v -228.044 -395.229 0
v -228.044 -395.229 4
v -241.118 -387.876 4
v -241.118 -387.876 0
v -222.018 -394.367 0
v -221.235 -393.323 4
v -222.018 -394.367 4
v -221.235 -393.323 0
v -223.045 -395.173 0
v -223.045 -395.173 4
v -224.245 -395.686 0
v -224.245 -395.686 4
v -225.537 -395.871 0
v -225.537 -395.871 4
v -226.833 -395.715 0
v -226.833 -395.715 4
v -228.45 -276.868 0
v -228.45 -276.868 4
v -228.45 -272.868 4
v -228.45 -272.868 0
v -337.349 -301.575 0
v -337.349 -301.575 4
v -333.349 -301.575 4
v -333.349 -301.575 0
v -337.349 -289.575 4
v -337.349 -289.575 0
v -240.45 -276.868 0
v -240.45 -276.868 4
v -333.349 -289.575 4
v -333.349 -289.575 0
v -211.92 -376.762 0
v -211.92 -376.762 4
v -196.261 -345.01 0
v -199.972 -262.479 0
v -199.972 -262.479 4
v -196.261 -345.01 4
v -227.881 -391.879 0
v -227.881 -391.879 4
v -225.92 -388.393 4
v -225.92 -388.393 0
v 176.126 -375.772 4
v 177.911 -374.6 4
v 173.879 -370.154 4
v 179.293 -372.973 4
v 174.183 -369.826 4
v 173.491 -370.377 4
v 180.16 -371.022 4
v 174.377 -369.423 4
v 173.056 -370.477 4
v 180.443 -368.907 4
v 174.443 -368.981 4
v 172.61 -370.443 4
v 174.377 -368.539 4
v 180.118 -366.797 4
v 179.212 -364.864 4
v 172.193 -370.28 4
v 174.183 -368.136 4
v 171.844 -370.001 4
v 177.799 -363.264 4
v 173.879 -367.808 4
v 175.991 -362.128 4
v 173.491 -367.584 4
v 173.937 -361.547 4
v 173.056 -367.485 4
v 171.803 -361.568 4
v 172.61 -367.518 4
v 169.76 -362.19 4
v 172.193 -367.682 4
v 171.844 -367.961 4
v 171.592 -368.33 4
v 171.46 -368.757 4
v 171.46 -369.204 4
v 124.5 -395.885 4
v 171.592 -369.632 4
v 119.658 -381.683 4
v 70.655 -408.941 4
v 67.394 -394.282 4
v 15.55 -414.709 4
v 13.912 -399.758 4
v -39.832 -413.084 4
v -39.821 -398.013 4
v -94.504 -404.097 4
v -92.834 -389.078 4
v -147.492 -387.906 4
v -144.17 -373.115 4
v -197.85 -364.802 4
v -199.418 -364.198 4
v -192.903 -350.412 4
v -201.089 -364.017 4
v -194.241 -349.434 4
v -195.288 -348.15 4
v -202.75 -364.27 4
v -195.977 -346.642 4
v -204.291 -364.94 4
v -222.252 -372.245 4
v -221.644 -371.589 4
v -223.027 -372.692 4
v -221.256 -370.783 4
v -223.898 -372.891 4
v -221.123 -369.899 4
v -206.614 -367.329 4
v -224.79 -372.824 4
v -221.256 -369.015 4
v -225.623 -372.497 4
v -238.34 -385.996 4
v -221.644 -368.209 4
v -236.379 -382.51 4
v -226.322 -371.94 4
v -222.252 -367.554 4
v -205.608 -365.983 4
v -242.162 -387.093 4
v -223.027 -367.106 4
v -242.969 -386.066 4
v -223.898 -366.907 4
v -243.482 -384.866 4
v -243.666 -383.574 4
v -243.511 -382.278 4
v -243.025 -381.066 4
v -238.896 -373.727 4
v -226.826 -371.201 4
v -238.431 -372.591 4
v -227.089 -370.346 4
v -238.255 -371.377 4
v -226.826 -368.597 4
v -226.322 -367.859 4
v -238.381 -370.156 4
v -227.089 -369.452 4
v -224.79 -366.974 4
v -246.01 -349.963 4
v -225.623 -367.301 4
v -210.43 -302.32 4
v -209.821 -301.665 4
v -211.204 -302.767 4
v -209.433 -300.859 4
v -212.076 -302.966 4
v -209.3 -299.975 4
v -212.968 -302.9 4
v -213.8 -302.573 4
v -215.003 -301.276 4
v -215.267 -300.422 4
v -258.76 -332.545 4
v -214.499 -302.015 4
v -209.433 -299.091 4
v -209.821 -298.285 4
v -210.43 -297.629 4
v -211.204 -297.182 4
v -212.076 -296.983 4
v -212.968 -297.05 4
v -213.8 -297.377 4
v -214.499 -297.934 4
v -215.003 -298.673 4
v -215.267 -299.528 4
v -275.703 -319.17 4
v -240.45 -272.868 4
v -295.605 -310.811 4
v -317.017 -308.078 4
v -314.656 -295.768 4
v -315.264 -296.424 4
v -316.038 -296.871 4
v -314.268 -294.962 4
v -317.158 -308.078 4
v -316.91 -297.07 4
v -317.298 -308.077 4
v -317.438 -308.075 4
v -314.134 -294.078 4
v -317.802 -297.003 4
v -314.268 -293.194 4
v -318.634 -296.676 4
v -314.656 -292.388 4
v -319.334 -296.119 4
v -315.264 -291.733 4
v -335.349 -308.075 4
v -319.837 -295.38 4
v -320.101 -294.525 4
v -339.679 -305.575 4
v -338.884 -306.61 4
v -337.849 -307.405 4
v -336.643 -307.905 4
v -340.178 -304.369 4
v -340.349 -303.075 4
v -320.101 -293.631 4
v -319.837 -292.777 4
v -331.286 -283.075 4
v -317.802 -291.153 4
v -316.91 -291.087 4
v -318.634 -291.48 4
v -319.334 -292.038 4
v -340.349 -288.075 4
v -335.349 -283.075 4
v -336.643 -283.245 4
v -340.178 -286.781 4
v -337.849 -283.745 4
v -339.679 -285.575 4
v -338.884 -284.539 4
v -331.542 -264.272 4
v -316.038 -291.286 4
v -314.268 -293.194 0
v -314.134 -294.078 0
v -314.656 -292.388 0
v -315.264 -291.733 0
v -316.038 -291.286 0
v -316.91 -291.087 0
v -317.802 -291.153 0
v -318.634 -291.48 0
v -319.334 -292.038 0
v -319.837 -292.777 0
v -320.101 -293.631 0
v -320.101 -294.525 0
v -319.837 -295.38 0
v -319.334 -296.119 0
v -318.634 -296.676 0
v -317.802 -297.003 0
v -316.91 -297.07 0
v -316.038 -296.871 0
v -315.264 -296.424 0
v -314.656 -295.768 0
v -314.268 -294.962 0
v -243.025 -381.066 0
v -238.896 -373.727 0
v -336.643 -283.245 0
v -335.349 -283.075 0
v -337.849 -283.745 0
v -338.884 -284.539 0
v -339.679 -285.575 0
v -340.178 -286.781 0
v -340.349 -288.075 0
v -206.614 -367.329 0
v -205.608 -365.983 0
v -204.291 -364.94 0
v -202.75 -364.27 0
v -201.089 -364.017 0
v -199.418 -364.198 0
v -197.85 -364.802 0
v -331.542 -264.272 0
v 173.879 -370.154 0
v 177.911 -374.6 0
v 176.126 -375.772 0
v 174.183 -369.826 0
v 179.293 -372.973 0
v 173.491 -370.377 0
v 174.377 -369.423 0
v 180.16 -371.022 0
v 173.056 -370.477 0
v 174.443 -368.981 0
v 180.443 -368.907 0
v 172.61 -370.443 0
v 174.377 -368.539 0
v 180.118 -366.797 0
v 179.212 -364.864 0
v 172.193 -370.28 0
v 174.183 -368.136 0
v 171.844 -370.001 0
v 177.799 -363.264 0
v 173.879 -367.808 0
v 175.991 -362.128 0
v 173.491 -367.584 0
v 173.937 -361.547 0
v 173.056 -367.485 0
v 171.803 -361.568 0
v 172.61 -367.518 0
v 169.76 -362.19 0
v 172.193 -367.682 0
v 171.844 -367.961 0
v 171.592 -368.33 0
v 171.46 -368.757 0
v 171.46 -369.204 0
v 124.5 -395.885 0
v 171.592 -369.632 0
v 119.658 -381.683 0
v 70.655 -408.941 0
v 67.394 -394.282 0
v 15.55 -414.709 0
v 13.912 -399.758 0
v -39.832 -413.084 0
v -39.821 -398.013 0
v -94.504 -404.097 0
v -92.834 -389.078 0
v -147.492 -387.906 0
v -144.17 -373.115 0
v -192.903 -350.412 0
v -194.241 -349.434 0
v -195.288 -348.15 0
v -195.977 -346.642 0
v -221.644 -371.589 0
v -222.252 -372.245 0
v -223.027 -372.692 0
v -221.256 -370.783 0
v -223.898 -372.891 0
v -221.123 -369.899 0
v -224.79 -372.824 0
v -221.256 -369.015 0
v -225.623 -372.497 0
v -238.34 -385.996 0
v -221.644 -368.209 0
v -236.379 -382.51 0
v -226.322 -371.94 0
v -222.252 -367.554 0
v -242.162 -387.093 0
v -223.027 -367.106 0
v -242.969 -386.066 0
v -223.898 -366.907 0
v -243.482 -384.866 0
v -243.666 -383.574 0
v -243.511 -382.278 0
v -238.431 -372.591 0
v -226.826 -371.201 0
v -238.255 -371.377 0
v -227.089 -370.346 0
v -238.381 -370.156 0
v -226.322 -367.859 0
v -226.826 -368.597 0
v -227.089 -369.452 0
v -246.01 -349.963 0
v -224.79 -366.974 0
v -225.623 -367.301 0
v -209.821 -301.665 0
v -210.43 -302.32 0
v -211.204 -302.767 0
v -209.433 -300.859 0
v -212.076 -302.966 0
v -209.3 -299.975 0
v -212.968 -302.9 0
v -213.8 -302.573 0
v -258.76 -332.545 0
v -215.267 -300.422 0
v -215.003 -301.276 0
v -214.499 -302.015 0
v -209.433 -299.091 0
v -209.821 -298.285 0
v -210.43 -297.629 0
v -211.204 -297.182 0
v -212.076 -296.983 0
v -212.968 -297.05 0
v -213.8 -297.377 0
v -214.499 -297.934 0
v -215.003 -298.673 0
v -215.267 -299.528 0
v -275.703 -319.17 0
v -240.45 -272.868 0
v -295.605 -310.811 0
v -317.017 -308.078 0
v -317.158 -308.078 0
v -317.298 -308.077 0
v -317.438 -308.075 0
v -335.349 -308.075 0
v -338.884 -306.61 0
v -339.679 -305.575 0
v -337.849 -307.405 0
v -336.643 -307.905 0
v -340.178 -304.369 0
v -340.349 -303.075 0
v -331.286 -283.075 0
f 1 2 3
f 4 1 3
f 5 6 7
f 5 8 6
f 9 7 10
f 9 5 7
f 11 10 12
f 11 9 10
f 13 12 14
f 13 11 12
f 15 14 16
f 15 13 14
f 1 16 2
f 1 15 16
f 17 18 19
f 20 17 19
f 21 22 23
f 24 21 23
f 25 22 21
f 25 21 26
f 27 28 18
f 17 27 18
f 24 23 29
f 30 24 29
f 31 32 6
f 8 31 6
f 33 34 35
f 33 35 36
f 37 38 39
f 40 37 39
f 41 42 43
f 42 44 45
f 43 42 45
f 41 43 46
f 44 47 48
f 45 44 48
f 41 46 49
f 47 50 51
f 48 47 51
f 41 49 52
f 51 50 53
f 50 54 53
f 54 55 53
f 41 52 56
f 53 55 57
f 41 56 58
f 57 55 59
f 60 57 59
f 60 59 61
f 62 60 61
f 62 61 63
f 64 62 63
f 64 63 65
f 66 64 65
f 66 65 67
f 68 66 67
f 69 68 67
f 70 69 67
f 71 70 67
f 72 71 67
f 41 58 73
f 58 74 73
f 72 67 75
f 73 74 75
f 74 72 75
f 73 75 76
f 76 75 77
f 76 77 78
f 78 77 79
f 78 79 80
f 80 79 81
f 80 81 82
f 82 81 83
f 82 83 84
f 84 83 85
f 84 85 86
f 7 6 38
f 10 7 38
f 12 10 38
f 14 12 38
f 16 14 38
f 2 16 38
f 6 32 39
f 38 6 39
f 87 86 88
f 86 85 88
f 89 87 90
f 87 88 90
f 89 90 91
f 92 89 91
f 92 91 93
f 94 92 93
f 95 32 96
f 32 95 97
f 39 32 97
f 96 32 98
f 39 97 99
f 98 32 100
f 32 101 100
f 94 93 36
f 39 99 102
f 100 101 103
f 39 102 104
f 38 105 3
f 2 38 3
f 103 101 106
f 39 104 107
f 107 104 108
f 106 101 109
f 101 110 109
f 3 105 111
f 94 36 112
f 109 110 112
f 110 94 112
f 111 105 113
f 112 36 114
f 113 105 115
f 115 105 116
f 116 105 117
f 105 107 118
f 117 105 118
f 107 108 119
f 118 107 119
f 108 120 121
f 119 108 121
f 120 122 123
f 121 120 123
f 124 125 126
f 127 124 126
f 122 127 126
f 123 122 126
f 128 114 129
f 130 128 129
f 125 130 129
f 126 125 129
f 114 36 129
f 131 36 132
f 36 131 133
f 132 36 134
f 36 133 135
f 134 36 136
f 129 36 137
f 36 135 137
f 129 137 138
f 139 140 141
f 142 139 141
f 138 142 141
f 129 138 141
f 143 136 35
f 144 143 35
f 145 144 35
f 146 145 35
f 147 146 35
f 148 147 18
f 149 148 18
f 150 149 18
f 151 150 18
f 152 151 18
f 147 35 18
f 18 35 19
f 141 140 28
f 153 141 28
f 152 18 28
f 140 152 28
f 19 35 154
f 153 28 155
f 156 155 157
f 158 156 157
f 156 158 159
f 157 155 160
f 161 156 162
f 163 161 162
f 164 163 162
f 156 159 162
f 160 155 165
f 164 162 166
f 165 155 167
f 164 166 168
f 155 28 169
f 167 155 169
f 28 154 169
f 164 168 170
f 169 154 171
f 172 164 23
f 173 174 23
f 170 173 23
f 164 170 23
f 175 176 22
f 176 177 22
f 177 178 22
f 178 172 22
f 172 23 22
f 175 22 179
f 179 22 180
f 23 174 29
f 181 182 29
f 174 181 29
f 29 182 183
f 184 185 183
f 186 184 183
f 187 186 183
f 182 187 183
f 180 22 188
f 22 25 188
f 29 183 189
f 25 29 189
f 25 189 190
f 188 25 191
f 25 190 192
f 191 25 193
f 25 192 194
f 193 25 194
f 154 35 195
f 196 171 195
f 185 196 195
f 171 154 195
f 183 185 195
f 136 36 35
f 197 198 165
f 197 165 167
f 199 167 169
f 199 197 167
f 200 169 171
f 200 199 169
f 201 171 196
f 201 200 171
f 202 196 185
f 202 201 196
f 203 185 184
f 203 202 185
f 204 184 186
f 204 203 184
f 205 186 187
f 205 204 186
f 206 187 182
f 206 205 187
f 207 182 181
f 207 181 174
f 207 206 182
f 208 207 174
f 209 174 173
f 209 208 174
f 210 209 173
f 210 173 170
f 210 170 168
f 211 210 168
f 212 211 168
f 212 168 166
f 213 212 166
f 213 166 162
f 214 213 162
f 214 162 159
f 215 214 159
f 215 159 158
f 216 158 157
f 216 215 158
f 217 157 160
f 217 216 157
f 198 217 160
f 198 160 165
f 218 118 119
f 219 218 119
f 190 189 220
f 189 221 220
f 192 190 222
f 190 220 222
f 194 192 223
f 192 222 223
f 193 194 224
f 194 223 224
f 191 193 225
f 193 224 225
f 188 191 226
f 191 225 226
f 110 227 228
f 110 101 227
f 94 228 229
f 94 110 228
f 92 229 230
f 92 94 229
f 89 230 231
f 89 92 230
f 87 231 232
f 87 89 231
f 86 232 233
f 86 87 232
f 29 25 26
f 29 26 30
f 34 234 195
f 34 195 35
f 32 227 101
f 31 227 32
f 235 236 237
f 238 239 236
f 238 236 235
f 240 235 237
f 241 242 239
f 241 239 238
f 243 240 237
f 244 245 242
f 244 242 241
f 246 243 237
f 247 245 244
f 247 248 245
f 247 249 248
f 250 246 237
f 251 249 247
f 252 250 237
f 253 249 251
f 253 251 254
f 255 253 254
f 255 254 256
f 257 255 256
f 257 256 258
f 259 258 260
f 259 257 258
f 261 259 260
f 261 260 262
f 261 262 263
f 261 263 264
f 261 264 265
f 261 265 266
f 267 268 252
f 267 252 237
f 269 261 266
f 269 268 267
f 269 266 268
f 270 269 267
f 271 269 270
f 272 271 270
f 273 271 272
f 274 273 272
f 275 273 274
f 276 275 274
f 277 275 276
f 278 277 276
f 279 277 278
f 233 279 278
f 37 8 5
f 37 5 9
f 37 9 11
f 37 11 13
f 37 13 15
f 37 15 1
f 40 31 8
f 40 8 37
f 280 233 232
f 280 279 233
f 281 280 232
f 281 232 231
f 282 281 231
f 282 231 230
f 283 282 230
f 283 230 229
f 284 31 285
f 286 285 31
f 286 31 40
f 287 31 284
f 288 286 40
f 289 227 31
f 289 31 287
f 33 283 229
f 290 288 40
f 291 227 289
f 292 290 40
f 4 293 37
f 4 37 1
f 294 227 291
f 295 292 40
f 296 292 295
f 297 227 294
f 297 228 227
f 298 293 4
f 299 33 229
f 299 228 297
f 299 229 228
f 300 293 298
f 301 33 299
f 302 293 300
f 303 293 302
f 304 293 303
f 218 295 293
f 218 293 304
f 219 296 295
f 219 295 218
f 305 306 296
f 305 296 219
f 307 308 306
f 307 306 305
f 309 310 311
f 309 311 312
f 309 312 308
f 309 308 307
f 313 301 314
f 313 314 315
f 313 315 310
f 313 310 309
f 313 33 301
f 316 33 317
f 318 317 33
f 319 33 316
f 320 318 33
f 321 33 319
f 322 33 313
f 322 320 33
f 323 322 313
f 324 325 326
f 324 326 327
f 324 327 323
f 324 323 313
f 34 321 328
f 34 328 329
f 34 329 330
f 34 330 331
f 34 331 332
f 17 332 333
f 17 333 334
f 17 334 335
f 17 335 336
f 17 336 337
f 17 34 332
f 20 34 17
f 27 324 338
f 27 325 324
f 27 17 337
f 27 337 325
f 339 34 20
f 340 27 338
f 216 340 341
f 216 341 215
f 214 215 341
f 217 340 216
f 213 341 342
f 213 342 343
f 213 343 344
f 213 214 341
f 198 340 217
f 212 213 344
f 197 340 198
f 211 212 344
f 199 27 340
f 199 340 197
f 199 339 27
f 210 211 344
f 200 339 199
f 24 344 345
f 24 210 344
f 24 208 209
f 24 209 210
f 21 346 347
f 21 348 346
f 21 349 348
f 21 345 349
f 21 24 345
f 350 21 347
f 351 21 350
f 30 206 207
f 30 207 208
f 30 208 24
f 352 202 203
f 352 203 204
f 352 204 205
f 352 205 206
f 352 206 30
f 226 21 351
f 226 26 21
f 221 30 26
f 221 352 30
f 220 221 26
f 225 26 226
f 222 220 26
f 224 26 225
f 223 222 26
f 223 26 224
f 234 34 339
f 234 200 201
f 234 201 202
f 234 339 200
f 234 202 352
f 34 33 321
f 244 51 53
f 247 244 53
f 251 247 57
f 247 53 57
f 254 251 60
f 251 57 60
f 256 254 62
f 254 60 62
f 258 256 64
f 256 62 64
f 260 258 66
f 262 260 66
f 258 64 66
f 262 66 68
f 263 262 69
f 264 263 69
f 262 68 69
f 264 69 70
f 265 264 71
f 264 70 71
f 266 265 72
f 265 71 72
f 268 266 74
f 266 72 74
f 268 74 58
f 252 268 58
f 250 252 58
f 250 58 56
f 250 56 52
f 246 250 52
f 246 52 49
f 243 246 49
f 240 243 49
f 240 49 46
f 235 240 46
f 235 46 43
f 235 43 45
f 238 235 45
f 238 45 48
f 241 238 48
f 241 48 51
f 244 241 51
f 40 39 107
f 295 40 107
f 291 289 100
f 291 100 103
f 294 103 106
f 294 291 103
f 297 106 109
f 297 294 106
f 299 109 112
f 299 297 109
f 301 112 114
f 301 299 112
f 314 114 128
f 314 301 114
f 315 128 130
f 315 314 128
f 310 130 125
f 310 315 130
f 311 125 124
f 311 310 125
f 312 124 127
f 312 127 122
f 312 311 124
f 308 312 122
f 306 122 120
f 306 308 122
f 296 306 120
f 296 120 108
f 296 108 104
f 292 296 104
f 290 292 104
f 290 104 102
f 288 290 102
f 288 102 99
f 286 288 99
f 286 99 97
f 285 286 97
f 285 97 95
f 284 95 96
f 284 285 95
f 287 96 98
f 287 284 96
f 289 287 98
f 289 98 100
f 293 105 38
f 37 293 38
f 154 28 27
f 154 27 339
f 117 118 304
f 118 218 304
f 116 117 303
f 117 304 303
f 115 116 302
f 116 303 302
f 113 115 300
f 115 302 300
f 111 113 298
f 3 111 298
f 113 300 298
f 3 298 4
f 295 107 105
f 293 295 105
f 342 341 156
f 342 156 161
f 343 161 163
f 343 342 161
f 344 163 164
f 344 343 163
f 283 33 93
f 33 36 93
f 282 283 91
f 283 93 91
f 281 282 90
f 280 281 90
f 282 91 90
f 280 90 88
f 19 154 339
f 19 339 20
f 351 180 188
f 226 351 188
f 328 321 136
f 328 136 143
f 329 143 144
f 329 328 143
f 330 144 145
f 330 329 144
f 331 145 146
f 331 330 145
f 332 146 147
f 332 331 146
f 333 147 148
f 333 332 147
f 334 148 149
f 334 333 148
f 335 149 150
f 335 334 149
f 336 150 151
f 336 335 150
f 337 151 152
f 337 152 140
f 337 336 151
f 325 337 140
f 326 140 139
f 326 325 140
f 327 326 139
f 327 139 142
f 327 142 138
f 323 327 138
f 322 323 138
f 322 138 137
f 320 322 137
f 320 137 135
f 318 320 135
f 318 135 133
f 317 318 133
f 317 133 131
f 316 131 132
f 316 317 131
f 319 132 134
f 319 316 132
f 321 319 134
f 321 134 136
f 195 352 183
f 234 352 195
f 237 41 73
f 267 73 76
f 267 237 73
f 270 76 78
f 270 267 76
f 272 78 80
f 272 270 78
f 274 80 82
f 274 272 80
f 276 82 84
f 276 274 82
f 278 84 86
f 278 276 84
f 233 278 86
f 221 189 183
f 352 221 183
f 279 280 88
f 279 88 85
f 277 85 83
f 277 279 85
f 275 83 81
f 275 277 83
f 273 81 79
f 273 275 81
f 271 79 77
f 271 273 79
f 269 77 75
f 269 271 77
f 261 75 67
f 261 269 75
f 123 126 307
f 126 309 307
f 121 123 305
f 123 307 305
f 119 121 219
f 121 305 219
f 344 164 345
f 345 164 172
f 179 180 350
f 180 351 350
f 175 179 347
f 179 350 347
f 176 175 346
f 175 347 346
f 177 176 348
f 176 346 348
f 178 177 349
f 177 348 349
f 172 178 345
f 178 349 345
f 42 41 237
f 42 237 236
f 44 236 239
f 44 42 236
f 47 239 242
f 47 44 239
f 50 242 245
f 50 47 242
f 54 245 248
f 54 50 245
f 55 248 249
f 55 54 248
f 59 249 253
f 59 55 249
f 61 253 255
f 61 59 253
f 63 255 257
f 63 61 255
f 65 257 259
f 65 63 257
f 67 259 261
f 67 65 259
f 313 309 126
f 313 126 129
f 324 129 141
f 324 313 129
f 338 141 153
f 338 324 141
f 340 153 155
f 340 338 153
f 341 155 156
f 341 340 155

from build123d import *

# Parameters (mm, degrees)
ESQUISSE2_R             = 3
BOSS_EXTRU_1_DEPTH      = 4
ESQUISSE3_R             = 1.5
ENL_V_MAT_EXTRU_1_DEPTH = 5
CONG_1_R                = 6.5
ESQUISSE4_W             = 4
ESQUISSE4_H             = 12
BOSS_EXTRU_2_DEPTH      = 4
CONG_2_R                = 5
ESQUISSE5_W             = 12
ESQUISSE5_H             = 4
ENL_V_MAT_EXTRU_2_DEPTH = 4


with BuildPart() as part:
    # Esquisse2 → Boss.-Extru.1 (new body)
    with BuildSketch(Plane.XY):
        with BuildLine():
            Line((-199.971644797, -262.478940861), (-196.098548459, -348.633560192))
            ThreePointArc((-196.098548459, -348.633560192), (-8.923258694, -399.900456932), (180.352503917, -357.033575915))
            Line((180.352503917, -357.033575915), (187.115722814, -370.422335012))
            ThreePointArc((187.115722814, -370.422335012), (-9.257880895, -414.896724067), (-203.452244027, -361.707318699))
            Line((-203.452244027, -361.707318699), (-211.920441681, -376.762493353))
            ThreePointArc((-211.920441681, -376.762493353), (-226.337772202, -383.722686379), (-237.858405423, -372.606089933))
            ThreePointArc((-237.858405423, -372.606089933), (-265.801404699, -326.067035455), (-317.01741072, -308.077718418))
            ThreePointArc((-317.01741072, -308.077718418), (-326.924525304, -304.085923492), (-331.133147983, -294.268956483))
            Line((-331.133147983, -294.268956483), (-331.541895531, -264.271741188))
            Line((-331.541895531, -264.271741188), (-199.971644797, -262.478940861))
        make_face()
        with Locations((-317.134447512, -294.078207627)):
            Circle(ESQUISSE2_R, mode=Mode.SUBTRACT)
        with Locations((-212.300150205, -299.974825982)):
            Circle(ESQUISSE2_R, mode=Mode.SUBTRACT)
        with Locations((-224.122616287, -369.899044157)):
            Circle(ESQUISSE2_R, mode=Mode.SUBTRACT)
    extrude(amount=BOSS_EXTRU_1_DEPTH)

    # Esquisse3 → Enlèv. mat.-Extru.1 (cut, through all)
    with BuildSketch(Plane.XY.offset(4)):
        with Locations((172.9434239, -368.980788294)):
            Circle(ESQUISSE3_R)
        with BuildLine():
            Line((169.760416098, -362.18973084), (162.877223829, -362.18973084))
            Line((162.877223829, -362.18973084), (180.965097343, -354.152116582))
            Line((180.965097343, -354.152116582), (180.352503917, -357.033575915))
            Line((180.352503917, -357.033575915), (187.115722814, -370.422335012))
            Line((187.115722814, -370.422335012), (190.286834204, -373.47465723))
            Line((190.286834204, -373.47465723), (174.853495029, -378.475059123))
            Line((174.853495029, -378.475059123), (176.126431702, -375.771845747))
            ThreePointArc((176.126431702, -375.771845747), (179.734481353, -365.797780492), (169.760416098, -362.18973084))
        make_face()
    extrude(amount=-ENL_V_MAT_EXTRU_1_DEPTH, mode=Mode.SUBTRACT)

    # Congé1
    cong_1_edges = [part.edges().sort_by_distance(p)[0] for p in [
        (-203.452244027, -361.707318699, 2),
        (-196.098548459, -348.633560192, 2),
    ]]
    fillet(cong_1_edges, radius=CONG_1_R)

    # Esquisse4 → Boss.-Extru.2 (add)
    with BuildSketch(Plane.XY.offset(4)):
        Polygon((-211.920441681, -376.762493353), (-223.686354588, -397.680506965), (-245.4759521, -385.424347686), (-237.96555462, -372.071996878), (-225.374330656, -376.762493353), align=None)
        Polygon((-238.339917634, -385.996197397), (-227.880910828, -391.879153851), (-225.919925343, -388.392818249), (-236.378932149, -382.509861795), align=None, mode=Mode.SUBTRACT)
        Polygon((-316.348629052, -308.074922938), (-340.348629052, -308.074922938), (-340.348629052, -283.074922938), (-331.285679934, -283.074922938), align=None)
        with Locations((-335.348629052, -295.574922938)):
            Rectangle(ESQUISSE4_W, ESQUISSE4_H, mode=Mode.SUBTRACT)
    extrude(amount=-BOSS_EXTRU_2_DEPTH)

    # Congé2
    cong_2_edges = [part.edges().sort_by_distance(p)[0] for p in [
        (-340.348629052, -308.074922938, 2),
        (-340.348629052, -283.074922938, 2),
        (-223.686354588, -397.680506965, 2),
        (-245.4759521, -385.424347686, 2),
        (-237.96555462, -372.071996878, 2),
    ]]
    fillet(cong_2_edges, radius=CONG_2_R)

    # Esquisse5 → Enlèv. mat.-Extru.2 (cut)
    with BuildSketch(Plane.XY.offset(4)):
        with Locations((-234.450045065, -274.867921079)):
            Rectangle(ESQUISSE5_W, ESQUISSE5_H)
    extrude(amount=-ENL_V_MAT_EXTRU_2_DEPTH, mode=Mode.SUBTRACT)


solid = part.part
